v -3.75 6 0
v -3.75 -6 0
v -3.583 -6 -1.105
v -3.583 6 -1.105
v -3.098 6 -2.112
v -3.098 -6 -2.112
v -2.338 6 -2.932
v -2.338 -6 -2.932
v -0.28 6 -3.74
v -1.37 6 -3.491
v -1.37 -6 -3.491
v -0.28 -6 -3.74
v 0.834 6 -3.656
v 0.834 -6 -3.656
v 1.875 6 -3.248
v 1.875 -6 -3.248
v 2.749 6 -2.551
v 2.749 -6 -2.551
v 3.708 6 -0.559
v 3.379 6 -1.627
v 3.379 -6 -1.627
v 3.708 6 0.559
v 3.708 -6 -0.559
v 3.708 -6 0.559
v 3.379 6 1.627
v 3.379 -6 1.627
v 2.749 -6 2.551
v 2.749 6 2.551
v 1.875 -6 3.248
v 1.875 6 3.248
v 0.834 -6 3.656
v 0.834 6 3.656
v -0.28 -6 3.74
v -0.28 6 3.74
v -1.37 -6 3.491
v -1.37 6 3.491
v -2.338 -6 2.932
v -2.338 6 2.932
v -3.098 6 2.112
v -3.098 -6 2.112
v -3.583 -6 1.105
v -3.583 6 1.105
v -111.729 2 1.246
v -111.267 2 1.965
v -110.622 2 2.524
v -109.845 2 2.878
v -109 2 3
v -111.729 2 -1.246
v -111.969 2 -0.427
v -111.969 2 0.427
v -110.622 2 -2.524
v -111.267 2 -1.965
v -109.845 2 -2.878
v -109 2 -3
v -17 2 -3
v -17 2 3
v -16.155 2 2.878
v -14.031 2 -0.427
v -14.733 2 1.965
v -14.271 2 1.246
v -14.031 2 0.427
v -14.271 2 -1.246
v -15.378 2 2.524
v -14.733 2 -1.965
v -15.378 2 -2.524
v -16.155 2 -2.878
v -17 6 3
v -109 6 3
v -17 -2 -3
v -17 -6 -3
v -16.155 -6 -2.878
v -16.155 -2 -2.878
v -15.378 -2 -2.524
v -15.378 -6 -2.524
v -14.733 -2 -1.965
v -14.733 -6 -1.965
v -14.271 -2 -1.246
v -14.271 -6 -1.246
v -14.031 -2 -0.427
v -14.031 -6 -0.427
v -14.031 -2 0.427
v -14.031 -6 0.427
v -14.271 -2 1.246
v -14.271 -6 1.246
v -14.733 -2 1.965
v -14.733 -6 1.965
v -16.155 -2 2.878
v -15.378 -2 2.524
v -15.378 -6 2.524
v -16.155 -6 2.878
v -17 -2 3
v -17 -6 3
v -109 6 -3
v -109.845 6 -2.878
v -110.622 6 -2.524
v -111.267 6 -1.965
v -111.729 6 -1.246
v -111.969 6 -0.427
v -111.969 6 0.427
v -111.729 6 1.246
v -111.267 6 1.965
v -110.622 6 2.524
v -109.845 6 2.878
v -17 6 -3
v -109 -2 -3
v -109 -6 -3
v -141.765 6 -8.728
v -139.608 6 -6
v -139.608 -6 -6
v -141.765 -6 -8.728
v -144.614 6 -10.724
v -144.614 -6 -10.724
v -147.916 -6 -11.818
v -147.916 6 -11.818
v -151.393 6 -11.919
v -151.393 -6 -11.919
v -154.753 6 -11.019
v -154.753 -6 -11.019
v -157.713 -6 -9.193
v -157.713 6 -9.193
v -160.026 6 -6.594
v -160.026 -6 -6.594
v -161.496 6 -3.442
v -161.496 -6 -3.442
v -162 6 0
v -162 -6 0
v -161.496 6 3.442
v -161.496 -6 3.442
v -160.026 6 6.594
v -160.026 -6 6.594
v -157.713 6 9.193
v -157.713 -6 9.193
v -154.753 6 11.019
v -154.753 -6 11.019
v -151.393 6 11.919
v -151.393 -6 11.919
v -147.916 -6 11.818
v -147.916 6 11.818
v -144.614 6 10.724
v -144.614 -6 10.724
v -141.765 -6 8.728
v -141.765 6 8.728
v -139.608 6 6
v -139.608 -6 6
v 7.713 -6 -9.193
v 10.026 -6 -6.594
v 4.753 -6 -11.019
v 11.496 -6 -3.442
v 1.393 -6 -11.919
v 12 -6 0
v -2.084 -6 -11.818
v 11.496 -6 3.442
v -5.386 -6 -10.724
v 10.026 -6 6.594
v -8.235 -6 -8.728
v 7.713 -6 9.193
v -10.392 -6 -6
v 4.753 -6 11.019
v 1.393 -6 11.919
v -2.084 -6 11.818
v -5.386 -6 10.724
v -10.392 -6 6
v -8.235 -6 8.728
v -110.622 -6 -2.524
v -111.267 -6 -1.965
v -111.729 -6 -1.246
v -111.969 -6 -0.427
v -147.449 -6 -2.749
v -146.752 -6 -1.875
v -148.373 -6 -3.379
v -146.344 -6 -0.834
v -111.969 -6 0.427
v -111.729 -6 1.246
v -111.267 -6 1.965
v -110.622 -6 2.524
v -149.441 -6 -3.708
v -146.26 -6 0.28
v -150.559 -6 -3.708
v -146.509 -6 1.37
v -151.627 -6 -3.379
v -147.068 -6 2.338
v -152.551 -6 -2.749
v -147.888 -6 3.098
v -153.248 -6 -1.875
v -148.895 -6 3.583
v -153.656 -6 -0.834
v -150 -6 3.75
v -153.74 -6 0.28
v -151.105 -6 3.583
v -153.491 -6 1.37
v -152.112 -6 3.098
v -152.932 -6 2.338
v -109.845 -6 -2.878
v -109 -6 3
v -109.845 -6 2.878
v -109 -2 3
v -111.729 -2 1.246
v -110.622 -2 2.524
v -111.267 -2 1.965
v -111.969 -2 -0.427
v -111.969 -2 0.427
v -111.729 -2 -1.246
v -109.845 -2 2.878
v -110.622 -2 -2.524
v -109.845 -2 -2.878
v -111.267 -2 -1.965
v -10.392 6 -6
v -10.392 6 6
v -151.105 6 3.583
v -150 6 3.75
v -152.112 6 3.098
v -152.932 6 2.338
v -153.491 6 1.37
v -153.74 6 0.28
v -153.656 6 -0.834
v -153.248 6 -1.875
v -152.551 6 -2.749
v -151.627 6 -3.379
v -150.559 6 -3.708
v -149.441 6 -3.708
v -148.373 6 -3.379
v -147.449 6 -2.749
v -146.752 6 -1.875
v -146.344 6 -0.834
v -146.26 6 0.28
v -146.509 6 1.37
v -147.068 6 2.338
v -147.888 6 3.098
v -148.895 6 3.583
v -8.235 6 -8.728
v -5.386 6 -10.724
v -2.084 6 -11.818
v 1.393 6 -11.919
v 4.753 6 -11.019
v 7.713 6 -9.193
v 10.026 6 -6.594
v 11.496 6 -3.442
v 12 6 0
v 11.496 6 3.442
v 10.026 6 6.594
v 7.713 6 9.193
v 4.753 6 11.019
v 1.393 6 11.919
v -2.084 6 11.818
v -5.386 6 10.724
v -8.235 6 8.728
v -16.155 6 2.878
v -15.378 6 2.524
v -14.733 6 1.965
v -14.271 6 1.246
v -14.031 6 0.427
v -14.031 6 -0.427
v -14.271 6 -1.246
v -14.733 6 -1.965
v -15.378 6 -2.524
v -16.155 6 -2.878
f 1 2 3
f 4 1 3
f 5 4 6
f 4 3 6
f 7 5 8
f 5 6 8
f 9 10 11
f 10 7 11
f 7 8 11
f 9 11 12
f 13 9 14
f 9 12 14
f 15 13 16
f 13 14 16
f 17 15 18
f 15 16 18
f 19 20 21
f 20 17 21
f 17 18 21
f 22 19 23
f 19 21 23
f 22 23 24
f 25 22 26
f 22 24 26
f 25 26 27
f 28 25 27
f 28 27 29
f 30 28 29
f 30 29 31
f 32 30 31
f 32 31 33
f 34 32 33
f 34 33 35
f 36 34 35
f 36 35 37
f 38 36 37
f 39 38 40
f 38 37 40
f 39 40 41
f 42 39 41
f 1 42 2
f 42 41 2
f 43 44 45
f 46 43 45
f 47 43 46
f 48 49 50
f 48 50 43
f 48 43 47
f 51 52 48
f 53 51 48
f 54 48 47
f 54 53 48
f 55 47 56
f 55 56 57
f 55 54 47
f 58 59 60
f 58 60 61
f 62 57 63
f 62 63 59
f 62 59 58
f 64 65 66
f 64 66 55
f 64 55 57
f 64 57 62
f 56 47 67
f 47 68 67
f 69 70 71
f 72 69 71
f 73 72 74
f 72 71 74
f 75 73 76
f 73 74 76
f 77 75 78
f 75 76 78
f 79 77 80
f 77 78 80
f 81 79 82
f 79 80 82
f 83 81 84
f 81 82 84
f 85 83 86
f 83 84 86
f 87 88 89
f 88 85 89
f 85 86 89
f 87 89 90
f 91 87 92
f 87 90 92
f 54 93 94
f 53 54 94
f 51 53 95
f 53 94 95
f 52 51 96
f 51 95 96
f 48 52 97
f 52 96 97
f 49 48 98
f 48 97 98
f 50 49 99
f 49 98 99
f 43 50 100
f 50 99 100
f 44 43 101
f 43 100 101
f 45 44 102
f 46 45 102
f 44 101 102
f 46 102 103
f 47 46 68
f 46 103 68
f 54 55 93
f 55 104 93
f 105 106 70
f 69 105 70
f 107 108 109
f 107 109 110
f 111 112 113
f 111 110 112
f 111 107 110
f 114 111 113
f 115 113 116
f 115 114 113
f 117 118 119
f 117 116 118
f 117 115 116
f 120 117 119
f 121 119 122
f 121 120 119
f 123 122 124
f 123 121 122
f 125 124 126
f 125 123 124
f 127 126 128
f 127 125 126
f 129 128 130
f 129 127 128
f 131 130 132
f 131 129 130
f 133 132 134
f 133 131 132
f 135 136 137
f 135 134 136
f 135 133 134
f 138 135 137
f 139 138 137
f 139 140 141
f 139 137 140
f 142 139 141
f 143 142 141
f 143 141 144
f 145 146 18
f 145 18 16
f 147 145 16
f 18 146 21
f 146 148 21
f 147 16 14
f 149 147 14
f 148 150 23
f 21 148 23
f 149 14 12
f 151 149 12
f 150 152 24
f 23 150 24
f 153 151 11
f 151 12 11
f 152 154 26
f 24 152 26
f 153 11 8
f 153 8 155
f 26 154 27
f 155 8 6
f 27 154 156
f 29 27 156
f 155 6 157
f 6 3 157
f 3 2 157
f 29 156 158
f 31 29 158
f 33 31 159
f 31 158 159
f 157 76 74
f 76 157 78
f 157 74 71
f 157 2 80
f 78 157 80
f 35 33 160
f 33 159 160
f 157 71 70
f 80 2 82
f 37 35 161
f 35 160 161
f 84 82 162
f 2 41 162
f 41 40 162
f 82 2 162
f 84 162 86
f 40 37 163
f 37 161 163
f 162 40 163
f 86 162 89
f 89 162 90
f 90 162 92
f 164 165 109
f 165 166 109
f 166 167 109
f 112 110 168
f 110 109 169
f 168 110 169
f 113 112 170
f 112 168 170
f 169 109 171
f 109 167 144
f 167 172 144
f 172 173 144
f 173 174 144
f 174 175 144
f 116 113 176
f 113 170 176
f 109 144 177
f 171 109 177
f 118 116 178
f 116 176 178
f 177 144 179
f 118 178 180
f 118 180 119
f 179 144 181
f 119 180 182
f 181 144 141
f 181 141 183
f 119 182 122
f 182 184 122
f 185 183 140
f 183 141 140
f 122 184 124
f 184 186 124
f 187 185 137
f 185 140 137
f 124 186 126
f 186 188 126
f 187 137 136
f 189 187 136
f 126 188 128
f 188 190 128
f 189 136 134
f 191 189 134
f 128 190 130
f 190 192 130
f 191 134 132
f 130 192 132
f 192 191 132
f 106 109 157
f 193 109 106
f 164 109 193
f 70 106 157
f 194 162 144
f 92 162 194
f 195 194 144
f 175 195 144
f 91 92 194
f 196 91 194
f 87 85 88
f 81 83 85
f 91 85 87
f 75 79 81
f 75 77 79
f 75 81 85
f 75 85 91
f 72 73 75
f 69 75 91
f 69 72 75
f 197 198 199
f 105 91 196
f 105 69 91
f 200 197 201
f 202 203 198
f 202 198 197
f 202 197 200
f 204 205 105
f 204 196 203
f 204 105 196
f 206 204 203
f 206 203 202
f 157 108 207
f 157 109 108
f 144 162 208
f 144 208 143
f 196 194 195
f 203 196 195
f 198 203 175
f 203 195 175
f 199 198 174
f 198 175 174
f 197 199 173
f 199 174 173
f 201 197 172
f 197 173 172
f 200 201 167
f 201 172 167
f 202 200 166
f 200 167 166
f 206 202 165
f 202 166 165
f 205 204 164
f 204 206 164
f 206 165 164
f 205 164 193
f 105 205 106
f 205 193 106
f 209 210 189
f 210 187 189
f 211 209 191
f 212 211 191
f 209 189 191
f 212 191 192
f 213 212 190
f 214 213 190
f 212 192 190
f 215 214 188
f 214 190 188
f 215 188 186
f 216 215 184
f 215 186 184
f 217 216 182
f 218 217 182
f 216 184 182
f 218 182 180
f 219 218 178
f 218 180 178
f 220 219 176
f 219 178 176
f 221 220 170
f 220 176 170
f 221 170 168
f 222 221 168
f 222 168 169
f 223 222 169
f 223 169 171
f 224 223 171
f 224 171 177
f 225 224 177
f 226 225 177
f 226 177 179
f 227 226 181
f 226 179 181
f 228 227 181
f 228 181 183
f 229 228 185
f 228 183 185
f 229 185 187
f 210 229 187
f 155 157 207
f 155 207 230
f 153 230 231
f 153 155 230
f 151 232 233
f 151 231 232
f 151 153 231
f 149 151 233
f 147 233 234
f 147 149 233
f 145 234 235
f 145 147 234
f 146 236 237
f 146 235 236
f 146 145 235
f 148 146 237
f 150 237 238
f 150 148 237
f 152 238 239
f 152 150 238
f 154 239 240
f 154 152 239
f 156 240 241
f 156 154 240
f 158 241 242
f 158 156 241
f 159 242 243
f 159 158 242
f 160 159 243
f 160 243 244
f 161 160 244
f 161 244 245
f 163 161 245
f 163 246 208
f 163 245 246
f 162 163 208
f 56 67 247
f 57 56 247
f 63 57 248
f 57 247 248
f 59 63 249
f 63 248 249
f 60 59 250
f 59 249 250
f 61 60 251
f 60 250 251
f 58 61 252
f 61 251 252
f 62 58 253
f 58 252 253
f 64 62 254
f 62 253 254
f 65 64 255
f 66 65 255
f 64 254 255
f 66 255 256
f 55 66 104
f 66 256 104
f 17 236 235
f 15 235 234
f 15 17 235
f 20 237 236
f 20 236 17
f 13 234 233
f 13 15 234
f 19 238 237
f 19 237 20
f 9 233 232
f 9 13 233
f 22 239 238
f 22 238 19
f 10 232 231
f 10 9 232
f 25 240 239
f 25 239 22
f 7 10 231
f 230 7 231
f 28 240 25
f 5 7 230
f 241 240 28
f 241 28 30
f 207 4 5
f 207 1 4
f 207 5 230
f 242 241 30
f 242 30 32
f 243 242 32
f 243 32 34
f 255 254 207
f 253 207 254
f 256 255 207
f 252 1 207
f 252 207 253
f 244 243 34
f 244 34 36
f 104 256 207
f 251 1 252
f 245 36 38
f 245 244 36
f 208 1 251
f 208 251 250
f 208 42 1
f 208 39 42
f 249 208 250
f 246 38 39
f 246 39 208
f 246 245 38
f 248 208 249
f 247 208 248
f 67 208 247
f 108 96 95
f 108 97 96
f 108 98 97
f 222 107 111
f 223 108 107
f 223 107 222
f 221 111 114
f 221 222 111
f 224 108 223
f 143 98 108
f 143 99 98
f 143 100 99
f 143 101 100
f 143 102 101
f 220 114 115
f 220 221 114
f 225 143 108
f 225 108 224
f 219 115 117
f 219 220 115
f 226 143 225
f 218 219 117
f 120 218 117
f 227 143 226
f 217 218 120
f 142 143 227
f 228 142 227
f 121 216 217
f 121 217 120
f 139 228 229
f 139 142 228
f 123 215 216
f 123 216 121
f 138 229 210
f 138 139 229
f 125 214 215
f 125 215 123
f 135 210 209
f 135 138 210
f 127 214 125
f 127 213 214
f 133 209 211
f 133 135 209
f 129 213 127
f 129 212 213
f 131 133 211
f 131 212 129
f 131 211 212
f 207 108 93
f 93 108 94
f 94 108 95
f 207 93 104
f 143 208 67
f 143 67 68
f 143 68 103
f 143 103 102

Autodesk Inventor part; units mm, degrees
ref_plane "Arbeitsebene3" through (-142.5, 0, 0) normal (1, 0, 0) x (0, 1, 0)
sketch "Skizze1" plane through (0, 0, 0) normal (0, 1, 0) x (-1, 0, 0)
  arc A0 (10.3923, 6) -> (10.3923, -6) centre (0, 0) ccw
  line L0 (10.3923, 6) -> (150, 6)
  line L1 (150, 6) -> (150, -6)
  line L2 (150, -6) -> (10.3923, -6)
  line L3 (0, 0) -> (150, 0) construction
  circle A1 centre (0, 0) radius 3.75
  dimension "d0" = 24
  dimension "d1" = 12
  dimension "d2" = 7.5
  dimension "d3" = 150
extrude "Extrusion1" add sketch "Skizze1" along normal mid plane 12
ref_plane "Arbeitsebene1" through (0, 0, 0) normal (0, 1, 0) x (-1, 0, 0)
sketch "Skizze2" plane through (0, 0, 0) normal (0, 1, 0) x (-1, 0, 0)
  line L0 (150, 6) -> (150, -6) projected
  circle A0 centre (150, 0) radius 12
  point P0 (0, 0)
  dimension "d7" = 24
extrude "Extrusion2" add sketch "Skizze2" along normal mid plane 12
sketch "Skizze3" plane through (0, 6, 0) normal (0, 1, 0) x (1, 0, 0)
  arc A0 (-139.6077, 6) -> (-139.6077, -6) centre (-150, 0) ccw projected
  point P0 (0, 0)
hole "Bohrung1" at (-150, 6, 0) direction (0, -1, 0) diameter 7.5 depth 12
sketch "Skizze4" plane through (0, 6, 0) normal (0, 1, 0) x (1, 0, 0)
  line L0 (-17, 0) -> (-109, 0) construction
  line L1 (-17, 3) -> (-109, 3)
  line L2 (-109, -3) -> (-17, -3)
  arc A0 (-17, -3) -> (-17, 3) centre (-17, 0) ccw
  arc A1 (-109, 3) -> (-109, -3) centre (-109, 0) ccw
  circle A2 centre (-150, 0) radius 3.75 projected
  point P0 (0, 0)
  point P1 (-63, 0)
  point P2 (-14, 0)
  point P3 (-112, 0)
  point P4 (-63, 3)
  dimension "d18" = 6
  dimension "d20" = 98
  dimension "d21" = 150
  dimension "d22" = 14
extrude "Extrusion3" cut sketch "Skizze4" against normal blind 4 contours A0 L2 A1 L1
mirror "Spiegeln1" about plane through (0, 0, 0) normal (0, 1, 0) of "Extrusion3"
ref_plane "Arbeitsebene2" through (12, 0, 0) normal (1, 0, 0) x (0, 1, 0)
sketch "Skizze5" plane through (12, 0, 0) normal (1, 0, 0) x (0, 1, 0)
  point P0 (0, 0)
  point P1 (0, 0)
sketch "Skizze6" plane through (-142.5, 0, 0) normal (1, 0, 0) x (0, 1, 0)
  point P0 (0, 0)
  point P1 (0, 0)
properties part number "pleuel_third" material "Nickel-Kupfer-Legierung 400"
